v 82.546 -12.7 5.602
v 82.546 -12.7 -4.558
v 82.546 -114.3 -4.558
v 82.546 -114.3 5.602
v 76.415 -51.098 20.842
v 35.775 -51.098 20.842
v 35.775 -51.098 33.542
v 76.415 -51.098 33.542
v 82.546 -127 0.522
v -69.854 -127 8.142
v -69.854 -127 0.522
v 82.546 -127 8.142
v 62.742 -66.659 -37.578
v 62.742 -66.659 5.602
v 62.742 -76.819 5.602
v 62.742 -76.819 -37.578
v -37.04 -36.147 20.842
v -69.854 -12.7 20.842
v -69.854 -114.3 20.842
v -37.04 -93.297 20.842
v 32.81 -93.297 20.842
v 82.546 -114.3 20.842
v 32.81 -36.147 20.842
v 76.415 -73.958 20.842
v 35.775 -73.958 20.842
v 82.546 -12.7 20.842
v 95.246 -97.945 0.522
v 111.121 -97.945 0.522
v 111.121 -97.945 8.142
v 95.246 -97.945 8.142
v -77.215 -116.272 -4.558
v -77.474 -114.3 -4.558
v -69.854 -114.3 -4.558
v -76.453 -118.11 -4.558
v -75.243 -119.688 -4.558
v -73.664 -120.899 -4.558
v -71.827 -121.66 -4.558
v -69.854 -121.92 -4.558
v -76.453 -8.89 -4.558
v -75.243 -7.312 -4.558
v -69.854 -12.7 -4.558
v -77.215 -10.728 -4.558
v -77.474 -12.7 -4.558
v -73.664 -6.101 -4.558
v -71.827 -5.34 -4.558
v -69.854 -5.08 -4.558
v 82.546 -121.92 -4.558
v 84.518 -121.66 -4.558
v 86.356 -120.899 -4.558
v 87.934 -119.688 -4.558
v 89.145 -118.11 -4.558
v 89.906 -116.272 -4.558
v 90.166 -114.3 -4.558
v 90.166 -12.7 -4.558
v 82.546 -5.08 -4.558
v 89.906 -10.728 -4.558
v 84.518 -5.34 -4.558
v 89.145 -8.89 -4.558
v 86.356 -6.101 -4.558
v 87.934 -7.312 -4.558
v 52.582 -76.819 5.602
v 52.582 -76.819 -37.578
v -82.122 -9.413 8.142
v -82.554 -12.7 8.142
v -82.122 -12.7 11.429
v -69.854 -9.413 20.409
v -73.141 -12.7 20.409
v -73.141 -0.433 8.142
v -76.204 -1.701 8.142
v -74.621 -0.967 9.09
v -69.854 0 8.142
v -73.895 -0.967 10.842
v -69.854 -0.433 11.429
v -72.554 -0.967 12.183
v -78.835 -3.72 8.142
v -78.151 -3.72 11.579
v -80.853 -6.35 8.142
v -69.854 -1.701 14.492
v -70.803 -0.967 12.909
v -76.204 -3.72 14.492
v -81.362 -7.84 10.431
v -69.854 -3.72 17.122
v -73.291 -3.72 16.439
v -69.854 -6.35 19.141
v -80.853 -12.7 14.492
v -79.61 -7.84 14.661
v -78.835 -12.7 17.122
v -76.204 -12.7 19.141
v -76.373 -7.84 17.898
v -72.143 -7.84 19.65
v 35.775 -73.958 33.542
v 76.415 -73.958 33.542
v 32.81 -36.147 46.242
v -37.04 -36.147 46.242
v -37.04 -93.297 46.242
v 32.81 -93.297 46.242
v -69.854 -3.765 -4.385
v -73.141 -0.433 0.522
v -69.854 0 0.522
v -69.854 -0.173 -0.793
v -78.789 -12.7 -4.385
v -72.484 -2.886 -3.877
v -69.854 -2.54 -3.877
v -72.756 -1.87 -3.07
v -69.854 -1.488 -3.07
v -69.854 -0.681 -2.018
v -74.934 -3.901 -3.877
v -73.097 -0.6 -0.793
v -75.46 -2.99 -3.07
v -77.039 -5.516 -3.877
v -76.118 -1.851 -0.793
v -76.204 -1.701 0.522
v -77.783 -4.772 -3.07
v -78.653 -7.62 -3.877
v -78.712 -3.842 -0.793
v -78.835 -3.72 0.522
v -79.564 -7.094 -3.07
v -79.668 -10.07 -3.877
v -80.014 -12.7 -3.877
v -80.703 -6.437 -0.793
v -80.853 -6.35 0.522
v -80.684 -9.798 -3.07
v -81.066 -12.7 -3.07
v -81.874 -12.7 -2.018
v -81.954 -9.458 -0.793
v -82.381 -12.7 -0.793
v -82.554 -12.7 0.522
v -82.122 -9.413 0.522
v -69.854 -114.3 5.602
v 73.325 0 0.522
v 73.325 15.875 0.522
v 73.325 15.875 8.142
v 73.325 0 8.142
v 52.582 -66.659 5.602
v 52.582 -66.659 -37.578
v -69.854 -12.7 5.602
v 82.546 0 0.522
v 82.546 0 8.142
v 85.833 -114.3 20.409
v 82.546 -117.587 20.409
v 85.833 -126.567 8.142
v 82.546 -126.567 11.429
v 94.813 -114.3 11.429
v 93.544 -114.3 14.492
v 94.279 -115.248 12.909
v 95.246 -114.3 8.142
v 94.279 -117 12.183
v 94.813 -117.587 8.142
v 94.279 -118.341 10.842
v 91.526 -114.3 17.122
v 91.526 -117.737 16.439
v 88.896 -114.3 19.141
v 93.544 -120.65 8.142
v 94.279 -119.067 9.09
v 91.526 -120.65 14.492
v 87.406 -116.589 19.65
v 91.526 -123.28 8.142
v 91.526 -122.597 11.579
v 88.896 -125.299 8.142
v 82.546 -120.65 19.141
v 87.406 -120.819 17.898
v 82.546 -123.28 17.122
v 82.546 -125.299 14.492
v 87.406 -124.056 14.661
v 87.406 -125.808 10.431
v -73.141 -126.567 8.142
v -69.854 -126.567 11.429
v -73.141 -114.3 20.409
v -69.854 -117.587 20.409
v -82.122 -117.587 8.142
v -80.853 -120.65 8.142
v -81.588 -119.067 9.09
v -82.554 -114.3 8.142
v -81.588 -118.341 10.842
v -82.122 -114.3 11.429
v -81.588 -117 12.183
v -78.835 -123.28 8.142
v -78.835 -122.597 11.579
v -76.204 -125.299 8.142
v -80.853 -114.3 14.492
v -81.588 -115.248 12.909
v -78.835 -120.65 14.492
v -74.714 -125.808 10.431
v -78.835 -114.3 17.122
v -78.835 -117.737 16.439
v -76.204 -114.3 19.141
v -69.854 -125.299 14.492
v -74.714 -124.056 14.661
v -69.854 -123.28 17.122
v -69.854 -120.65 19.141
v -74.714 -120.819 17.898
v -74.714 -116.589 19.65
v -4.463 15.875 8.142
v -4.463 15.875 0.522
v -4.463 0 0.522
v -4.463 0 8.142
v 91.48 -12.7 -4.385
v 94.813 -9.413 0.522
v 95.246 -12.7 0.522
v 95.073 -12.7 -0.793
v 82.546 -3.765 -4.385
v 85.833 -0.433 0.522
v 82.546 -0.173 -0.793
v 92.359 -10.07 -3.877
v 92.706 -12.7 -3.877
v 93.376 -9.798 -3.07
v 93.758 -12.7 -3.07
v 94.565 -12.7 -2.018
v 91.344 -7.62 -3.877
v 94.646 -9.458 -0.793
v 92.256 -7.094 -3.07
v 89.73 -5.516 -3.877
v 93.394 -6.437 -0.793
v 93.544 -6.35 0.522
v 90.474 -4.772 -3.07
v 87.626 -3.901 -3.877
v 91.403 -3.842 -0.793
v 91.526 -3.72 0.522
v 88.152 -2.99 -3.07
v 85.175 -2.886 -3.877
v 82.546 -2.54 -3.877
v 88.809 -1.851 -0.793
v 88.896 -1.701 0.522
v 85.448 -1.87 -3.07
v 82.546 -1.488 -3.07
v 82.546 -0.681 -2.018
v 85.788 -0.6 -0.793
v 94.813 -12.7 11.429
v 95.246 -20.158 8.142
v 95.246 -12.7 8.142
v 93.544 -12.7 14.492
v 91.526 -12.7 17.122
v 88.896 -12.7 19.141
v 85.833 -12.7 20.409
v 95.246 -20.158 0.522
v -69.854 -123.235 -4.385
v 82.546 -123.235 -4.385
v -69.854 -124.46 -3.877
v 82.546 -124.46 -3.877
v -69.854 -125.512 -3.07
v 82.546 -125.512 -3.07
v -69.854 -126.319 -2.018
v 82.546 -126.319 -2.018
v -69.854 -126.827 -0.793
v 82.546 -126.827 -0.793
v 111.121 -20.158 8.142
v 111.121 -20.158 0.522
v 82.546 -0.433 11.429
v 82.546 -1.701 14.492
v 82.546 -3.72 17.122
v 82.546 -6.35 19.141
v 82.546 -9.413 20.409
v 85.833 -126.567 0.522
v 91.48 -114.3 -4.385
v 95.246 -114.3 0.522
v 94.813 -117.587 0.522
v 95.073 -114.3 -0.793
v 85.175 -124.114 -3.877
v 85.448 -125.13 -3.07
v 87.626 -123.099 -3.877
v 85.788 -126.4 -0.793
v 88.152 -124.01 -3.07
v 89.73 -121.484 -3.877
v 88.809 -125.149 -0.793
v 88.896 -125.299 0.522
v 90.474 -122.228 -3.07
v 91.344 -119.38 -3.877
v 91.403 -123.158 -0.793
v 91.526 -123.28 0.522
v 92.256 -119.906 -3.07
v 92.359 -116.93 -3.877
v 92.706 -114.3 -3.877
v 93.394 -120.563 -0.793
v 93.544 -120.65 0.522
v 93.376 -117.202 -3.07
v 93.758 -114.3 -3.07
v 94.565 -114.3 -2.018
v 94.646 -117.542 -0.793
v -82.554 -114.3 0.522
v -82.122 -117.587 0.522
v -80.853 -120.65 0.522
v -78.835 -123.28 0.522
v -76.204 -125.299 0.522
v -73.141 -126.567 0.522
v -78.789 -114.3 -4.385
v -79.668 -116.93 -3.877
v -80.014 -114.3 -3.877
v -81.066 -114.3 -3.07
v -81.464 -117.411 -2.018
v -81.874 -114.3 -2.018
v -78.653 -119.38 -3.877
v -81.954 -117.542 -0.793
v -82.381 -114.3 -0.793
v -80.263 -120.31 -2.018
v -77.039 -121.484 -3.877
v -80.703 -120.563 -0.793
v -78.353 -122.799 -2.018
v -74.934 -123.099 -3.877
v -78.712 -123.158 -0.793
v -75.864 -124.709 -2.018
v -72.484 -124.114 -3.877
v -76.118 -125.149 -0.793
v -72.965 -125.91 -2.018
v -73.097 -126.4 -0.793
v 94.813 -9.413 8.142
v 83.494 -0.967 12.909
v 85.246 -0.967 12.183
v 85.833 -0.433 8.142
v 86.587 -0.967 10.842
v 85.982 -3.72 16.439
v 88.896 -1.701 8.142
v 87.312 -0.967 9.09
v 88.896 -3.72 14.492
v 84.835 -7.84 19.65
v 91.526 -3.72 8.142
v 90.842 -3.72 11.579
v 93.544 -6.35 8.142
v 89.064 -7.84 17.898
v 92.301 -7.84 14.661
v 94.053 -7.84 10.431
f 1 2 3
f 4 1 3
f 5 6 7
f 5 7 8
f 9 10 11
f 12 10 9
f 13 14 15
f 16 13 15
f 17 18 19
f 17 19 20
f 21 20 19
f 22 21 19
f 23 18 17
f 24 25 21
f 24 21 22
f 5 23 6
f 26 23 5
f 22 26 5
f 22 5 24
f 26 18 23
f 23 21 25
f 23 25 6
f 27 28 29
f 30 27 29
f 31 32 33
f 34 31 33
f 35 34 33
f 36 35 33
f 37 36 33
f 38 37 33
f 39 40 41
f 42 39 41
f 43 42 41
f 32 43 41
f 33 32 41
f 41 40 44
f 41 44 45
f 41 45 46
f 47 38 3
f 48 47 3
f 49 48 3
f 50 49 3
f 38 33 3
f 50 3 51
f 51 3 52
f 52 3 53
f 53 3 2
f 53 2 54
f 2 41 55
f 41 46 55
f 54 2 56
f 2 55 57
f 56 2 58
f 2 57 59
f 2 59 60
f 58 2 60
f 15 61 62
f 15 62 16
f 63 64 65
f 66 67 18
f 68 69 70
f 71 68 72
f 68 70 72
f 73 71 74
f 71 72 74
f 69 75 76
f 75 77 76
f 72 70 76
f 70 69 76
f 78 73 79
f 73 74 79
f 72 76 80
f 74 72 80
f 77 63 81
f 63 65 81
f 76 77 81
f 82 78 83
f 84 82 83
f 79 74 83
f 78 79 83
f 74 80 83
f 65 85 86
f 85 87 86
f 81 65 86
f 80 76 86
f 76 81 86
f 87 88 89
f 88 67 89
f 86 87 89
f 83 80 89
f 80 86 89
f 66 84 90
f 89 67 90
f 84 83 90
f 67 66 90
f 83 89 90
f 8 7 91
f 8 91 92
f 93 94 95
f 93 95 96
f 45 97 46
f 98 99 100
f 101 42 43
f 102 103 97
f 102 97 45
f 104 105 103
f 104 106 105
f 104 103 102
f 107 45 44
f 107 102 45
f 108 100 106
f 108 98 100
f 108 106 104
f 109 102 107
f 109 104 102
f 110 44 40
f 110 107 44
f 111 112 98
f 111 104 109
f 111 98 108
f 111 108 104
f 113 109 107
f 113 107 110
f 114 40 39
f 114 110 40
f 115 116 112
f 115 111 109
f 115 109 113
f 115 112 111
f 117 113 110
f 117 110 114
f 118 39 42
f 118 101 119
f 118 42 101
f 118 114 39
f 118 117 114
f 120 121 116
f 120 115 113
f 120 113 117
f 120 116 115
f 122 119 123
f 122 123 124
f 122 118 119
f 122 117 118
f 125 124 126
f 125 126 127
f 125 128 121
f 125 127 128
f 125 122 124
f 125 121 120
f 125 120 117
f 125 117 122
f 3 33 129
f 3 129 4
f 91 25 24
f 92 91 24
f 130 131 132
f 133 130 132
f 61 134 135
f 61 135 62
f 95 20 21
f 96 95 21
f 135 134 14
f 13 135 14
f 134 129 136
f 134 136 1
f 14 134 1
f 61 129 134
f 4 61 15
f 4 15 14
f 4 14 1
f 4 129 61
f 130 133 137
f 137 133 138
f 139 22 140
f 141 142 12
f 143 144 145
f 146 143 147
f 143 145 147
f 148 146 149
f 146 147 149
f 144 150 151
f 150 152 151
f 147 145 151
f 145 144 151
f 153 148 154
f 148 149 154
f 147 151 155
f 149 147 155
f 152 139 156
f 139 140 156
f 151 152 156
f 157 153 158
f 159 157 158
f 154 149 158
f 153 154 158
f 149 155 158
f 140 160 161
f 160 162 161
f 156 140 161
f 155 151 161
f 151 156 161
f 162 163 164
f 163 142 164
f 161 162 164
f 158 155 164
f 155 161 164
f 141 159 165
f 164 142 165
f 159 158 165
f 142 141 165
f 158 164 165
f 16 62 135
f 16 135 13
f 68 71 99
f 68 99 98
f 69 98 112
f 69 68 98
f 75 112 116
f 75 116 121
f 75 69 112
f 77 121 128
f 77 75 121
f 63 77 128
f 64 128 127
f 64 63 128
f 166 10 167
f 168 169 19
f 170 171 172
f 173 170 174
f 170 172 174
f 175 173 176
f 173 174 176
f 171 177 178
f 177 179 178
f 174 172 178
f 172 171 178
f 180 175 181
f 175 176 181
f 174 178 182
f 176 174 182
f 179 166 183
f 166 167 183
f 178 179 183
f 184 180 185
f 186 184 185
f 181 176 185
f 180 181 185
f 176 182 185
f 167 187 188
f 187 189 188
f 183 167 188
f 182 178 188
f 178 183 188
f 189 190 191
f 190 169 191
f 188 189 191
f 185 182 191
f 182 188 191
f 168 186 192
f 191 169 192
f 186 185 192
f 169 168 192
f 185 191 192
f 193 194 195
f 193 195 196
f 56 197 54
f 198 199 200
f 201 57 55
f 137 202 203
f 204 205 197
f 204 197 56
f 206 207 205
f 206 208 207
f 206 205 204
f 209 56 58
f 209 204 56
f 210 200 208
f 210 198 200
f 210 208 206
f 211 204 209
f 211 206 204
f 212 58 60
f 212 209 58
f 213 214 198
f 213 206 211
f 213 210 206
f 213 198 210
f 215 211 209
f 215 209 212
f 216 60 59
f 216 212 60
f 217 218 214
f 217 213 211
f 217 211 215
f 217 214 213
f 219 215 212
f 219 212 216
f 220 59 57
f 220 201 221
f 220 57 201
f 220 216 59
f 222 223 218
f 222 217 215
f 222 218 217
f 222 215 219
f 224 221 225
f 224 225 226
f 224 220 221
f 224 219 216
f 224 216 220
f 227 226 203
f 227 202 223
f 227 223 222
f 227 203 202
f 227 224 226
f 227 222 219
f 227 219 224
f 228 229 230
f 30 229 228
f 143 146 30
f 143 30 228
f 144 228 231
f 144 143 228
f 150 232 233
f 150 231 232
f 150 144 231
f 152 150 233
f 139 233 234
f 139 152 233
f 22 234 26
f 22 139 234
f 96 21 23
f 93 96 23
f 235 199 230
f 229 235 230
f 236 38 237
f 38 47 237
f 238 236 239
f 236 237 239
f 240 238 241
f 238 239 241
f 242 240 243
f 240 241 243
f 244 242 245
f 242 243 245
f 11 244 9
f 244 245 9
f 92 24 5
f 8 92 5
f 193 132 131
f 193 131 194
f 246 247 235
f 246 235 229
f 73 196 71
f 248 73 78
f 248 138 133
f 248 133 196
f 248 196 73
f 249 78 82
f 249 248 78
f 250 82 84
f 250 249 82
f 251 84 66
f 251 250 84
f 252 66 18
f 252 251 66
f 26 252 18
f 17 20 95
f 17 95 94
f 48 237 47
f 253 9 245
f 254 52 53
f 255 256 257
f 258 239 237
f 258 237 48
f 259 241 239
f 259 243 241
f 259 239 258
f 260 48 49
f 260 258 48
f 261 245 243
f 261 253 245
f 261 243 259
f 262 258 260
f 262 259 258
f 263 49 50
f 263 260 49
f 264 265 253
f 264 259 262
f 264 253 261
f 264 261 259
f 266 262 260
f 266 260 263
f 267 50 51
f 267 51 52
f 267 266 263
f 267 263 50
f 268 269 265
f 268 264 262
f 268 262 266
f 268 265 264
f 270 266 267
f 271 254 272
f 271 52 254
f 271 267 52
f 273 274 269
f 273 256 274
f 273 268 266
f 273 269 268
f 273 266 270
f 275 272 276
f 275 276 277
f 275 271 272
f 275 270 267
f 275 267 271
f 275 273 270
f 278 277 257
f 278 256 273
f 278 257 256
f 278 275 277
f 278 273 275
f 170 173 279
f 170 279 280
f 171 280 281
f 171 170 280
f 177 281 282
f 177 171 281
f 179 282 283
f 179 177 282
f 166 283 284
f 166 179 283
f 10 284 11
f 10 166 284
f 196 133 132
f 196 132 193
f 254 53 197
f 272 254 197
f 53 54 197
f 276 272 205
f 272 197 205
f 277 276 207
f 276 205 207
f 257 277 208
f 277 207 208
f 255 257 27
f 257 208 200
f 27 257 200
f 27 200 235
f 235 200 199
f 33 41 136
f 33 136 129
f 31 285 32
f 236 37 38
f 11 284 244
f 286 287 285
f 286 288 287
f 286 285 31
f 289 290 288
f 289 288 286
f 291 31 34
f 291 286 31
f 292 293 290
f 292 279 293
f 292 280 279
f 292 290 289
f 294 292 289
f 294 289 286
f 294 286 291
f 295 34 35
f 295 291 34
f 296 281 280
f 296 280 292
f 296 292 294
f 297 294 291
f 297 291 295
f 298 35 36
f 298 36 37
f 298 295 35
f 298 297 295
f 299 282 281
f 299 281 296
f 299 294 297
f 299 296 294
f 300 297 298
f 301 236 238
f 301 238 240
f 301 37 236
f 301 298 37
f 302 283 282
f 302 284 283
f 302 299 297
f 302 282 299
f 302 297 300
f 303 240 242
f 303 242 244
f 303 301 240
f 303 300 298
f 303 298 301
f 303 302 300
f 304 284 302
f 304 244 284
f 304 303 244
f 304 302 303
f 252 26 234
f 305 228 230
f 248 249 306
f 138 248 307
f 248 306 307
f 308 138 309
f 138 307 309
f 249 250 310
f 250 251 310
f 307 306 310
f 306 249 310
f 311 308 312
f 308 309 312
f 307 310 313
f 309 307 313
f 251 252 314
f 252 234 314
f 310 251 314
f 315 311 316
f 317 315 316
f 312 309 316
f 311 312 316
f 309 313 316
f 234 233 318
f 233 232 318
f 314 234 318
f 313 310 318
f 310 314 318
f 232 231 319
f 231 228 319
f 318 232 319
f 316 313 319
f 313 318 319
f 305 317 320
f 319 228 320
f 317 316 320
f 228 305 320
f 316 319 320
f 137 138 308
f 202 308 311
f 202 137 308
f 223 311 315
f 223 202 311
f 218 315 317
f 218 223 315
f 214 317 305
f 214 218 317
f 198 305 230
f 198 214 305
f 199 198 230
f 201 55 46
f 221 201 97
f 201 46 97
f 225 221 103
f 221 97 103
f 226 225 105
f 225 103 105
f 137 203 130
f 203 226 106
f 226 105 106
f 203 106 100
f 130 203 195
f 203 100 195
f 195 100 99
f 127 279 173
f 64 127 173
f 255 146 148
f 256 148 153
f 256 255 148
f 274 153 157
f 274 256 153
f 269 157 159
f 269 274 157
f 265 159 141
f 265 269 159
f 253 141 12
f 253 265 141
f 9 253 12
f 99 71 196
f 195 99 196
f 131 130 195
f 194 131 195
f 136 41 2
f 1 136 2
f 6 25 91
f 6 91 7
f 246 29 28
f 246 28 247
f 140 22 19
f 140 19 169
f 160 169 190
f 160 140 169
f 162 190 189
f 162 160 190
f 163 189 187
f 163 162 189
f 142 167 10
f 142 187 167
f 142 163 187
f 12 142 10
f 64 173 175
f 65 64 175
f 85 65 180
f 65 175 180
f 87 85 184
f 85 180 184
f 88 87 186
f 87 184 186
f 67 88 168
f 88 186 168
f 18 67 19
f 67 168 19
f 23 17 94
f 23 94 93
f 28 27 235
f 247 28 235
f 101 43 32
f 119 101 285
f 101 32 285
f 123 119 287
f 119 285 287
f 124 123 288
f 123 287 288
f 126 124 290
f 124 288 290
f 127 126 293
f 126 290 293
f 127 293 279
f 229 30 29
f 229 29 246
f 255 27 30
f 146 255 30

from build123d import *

# Parameters (mm, degrees)
F0_W      = 177.8
F0_H      = 25.4
F1_DEPTH  = 127
F2_R      = 12.7
F3_R      = 12.7
F4_R      = 12.7
F5_W      = 152.4
F5_H      = 101.6
F6_DEPTH  = 10.16
F7_R      = 5.08
F8_W      = 10.16
F8_H      = 10.16
F9_DEPTH  = 43.18
F10_W     = 69.85
F10_H     = 57.15
F11_DEPTH = 25.4
F10_W_2   = 40.64
F10_H_2   = 22.86
F12_DEPTH = 12.7
F13_W     = 77.7875
F13_H     = 7.62
F14_DEPTH = 15.875
F15_W     = 77.7875
F15_H     = 7.62
F16_DEPTH = 15.875


with BuildPart() as f1:
    # F0 (on Front) → F1 (new body)
    with BuildSketch(Plane.XZ):
        with Locations((6.3456185162, 8.1420660227)):
            Rectangle(F0_W, F0_H)
    extrude(amount=F1_DEPTH)

    # F2
    f2_edges = [f1.edges().sort_by_distance(p)[0] for p in [
        (6.345619, -127, 20.842066),
        (-82.554381, -127, 8.142066),
        (-82.554381, -63.5, 20.842066),
    ]]
    fillet(f2_edges, radius=F2_R)

    # F3
    f3_edges = [f1.edges().sort_by_distance(p)[0] for p in [
        (95.245619, -57.15, 20.842066),
        (12.695619, -114.3, 20.842066),
        (95.245619, -127, 1.792066),
    ]]
    fillet(f3_edges, radius=F3_R)

    # F4
    f4_edges = [f1.edges().sort_by_distance(p)[0] for p in [
        (6.345619, 0, 20.842066),
        (-69.854381, -57.15, 20.842066),
        (-82.554381, 0, 1.792066),
    ]]
    fillet(f4_edges, radius=F4_R)

    # F5 (on face) → F6 (cut)
    with BuildSketch(Plane(origin=(0, 0, -4.5579339773), x_dir=(1, 0, 0), z_dir=(0, 0, -1))):
        with Locations((6.3456185162, 63.5)):
            Rectangle(F5_W, F5_H)
    extrude(amount=-F6_DEPTH, mode=Mode.SUBTRACT)

    # F7
    f7_edges = [f1.edges().sort_by_distance(p)[0] for p in [
        (6.345619, -127, -4.557934),
        (95.245619, -63.5, -4.557934),
        (91.525875, -123.280256, -4.557934),
    ]]
    fillet(f7_edges, radius=F7_R)

    # F8 (on face) → F9 (join)
    with BuildSketch(Plane(origin=(0, 0, 5.6020660227), x_dir=(1, 0, 0), z_dir=(0, 0, -1))):
        with Locations((57.6618951797, 71.7390547824)):
            Rectangle(F8_W, F8_H)
    extrude(amount=F9_DEPTH)

    # F10 (on face) → F11 (join)
    with BuildSketch(Plane.XY.offset(20.8420660227)):
        with Locations((-2.115206793, -64.7223750857)):
            Rectangle(F10_W, F10_H)
    extrude(amount=F11_DEPTH)

    # F10 (on face) → F12 (join)
    with BuildSketch(Plane.XY.offset(20.8420660227)):
        with Locations((56.0945885849, -62.5277971399)):
            Rectangle(F10_W_2, F10_H_2)
    extrude(amount=F12_DEPTH)

    # F13 (on face) → F14 (join)
    with BuildSketch(Plane.YZ.offset(95.2456185162)):
        with Locations((-59.0517186254, 4.3320660227)):
            Rectangle(F13_W, F13_H)
    extrude(amount=F14_DEPTH)

    # F15 (on face) → F16 (join)
    with BuildSketch(Plane(origin=(0, 0, 0), x_dir=(-1, 0, 0), z_dir=(0, 1, 0))):
        with Locations((-34.4312283516, 4.3320660227)):
            Rectangle(F15_W, F15_H)
    extrude(amount=F16_DEPTH)


solid = f1.part
